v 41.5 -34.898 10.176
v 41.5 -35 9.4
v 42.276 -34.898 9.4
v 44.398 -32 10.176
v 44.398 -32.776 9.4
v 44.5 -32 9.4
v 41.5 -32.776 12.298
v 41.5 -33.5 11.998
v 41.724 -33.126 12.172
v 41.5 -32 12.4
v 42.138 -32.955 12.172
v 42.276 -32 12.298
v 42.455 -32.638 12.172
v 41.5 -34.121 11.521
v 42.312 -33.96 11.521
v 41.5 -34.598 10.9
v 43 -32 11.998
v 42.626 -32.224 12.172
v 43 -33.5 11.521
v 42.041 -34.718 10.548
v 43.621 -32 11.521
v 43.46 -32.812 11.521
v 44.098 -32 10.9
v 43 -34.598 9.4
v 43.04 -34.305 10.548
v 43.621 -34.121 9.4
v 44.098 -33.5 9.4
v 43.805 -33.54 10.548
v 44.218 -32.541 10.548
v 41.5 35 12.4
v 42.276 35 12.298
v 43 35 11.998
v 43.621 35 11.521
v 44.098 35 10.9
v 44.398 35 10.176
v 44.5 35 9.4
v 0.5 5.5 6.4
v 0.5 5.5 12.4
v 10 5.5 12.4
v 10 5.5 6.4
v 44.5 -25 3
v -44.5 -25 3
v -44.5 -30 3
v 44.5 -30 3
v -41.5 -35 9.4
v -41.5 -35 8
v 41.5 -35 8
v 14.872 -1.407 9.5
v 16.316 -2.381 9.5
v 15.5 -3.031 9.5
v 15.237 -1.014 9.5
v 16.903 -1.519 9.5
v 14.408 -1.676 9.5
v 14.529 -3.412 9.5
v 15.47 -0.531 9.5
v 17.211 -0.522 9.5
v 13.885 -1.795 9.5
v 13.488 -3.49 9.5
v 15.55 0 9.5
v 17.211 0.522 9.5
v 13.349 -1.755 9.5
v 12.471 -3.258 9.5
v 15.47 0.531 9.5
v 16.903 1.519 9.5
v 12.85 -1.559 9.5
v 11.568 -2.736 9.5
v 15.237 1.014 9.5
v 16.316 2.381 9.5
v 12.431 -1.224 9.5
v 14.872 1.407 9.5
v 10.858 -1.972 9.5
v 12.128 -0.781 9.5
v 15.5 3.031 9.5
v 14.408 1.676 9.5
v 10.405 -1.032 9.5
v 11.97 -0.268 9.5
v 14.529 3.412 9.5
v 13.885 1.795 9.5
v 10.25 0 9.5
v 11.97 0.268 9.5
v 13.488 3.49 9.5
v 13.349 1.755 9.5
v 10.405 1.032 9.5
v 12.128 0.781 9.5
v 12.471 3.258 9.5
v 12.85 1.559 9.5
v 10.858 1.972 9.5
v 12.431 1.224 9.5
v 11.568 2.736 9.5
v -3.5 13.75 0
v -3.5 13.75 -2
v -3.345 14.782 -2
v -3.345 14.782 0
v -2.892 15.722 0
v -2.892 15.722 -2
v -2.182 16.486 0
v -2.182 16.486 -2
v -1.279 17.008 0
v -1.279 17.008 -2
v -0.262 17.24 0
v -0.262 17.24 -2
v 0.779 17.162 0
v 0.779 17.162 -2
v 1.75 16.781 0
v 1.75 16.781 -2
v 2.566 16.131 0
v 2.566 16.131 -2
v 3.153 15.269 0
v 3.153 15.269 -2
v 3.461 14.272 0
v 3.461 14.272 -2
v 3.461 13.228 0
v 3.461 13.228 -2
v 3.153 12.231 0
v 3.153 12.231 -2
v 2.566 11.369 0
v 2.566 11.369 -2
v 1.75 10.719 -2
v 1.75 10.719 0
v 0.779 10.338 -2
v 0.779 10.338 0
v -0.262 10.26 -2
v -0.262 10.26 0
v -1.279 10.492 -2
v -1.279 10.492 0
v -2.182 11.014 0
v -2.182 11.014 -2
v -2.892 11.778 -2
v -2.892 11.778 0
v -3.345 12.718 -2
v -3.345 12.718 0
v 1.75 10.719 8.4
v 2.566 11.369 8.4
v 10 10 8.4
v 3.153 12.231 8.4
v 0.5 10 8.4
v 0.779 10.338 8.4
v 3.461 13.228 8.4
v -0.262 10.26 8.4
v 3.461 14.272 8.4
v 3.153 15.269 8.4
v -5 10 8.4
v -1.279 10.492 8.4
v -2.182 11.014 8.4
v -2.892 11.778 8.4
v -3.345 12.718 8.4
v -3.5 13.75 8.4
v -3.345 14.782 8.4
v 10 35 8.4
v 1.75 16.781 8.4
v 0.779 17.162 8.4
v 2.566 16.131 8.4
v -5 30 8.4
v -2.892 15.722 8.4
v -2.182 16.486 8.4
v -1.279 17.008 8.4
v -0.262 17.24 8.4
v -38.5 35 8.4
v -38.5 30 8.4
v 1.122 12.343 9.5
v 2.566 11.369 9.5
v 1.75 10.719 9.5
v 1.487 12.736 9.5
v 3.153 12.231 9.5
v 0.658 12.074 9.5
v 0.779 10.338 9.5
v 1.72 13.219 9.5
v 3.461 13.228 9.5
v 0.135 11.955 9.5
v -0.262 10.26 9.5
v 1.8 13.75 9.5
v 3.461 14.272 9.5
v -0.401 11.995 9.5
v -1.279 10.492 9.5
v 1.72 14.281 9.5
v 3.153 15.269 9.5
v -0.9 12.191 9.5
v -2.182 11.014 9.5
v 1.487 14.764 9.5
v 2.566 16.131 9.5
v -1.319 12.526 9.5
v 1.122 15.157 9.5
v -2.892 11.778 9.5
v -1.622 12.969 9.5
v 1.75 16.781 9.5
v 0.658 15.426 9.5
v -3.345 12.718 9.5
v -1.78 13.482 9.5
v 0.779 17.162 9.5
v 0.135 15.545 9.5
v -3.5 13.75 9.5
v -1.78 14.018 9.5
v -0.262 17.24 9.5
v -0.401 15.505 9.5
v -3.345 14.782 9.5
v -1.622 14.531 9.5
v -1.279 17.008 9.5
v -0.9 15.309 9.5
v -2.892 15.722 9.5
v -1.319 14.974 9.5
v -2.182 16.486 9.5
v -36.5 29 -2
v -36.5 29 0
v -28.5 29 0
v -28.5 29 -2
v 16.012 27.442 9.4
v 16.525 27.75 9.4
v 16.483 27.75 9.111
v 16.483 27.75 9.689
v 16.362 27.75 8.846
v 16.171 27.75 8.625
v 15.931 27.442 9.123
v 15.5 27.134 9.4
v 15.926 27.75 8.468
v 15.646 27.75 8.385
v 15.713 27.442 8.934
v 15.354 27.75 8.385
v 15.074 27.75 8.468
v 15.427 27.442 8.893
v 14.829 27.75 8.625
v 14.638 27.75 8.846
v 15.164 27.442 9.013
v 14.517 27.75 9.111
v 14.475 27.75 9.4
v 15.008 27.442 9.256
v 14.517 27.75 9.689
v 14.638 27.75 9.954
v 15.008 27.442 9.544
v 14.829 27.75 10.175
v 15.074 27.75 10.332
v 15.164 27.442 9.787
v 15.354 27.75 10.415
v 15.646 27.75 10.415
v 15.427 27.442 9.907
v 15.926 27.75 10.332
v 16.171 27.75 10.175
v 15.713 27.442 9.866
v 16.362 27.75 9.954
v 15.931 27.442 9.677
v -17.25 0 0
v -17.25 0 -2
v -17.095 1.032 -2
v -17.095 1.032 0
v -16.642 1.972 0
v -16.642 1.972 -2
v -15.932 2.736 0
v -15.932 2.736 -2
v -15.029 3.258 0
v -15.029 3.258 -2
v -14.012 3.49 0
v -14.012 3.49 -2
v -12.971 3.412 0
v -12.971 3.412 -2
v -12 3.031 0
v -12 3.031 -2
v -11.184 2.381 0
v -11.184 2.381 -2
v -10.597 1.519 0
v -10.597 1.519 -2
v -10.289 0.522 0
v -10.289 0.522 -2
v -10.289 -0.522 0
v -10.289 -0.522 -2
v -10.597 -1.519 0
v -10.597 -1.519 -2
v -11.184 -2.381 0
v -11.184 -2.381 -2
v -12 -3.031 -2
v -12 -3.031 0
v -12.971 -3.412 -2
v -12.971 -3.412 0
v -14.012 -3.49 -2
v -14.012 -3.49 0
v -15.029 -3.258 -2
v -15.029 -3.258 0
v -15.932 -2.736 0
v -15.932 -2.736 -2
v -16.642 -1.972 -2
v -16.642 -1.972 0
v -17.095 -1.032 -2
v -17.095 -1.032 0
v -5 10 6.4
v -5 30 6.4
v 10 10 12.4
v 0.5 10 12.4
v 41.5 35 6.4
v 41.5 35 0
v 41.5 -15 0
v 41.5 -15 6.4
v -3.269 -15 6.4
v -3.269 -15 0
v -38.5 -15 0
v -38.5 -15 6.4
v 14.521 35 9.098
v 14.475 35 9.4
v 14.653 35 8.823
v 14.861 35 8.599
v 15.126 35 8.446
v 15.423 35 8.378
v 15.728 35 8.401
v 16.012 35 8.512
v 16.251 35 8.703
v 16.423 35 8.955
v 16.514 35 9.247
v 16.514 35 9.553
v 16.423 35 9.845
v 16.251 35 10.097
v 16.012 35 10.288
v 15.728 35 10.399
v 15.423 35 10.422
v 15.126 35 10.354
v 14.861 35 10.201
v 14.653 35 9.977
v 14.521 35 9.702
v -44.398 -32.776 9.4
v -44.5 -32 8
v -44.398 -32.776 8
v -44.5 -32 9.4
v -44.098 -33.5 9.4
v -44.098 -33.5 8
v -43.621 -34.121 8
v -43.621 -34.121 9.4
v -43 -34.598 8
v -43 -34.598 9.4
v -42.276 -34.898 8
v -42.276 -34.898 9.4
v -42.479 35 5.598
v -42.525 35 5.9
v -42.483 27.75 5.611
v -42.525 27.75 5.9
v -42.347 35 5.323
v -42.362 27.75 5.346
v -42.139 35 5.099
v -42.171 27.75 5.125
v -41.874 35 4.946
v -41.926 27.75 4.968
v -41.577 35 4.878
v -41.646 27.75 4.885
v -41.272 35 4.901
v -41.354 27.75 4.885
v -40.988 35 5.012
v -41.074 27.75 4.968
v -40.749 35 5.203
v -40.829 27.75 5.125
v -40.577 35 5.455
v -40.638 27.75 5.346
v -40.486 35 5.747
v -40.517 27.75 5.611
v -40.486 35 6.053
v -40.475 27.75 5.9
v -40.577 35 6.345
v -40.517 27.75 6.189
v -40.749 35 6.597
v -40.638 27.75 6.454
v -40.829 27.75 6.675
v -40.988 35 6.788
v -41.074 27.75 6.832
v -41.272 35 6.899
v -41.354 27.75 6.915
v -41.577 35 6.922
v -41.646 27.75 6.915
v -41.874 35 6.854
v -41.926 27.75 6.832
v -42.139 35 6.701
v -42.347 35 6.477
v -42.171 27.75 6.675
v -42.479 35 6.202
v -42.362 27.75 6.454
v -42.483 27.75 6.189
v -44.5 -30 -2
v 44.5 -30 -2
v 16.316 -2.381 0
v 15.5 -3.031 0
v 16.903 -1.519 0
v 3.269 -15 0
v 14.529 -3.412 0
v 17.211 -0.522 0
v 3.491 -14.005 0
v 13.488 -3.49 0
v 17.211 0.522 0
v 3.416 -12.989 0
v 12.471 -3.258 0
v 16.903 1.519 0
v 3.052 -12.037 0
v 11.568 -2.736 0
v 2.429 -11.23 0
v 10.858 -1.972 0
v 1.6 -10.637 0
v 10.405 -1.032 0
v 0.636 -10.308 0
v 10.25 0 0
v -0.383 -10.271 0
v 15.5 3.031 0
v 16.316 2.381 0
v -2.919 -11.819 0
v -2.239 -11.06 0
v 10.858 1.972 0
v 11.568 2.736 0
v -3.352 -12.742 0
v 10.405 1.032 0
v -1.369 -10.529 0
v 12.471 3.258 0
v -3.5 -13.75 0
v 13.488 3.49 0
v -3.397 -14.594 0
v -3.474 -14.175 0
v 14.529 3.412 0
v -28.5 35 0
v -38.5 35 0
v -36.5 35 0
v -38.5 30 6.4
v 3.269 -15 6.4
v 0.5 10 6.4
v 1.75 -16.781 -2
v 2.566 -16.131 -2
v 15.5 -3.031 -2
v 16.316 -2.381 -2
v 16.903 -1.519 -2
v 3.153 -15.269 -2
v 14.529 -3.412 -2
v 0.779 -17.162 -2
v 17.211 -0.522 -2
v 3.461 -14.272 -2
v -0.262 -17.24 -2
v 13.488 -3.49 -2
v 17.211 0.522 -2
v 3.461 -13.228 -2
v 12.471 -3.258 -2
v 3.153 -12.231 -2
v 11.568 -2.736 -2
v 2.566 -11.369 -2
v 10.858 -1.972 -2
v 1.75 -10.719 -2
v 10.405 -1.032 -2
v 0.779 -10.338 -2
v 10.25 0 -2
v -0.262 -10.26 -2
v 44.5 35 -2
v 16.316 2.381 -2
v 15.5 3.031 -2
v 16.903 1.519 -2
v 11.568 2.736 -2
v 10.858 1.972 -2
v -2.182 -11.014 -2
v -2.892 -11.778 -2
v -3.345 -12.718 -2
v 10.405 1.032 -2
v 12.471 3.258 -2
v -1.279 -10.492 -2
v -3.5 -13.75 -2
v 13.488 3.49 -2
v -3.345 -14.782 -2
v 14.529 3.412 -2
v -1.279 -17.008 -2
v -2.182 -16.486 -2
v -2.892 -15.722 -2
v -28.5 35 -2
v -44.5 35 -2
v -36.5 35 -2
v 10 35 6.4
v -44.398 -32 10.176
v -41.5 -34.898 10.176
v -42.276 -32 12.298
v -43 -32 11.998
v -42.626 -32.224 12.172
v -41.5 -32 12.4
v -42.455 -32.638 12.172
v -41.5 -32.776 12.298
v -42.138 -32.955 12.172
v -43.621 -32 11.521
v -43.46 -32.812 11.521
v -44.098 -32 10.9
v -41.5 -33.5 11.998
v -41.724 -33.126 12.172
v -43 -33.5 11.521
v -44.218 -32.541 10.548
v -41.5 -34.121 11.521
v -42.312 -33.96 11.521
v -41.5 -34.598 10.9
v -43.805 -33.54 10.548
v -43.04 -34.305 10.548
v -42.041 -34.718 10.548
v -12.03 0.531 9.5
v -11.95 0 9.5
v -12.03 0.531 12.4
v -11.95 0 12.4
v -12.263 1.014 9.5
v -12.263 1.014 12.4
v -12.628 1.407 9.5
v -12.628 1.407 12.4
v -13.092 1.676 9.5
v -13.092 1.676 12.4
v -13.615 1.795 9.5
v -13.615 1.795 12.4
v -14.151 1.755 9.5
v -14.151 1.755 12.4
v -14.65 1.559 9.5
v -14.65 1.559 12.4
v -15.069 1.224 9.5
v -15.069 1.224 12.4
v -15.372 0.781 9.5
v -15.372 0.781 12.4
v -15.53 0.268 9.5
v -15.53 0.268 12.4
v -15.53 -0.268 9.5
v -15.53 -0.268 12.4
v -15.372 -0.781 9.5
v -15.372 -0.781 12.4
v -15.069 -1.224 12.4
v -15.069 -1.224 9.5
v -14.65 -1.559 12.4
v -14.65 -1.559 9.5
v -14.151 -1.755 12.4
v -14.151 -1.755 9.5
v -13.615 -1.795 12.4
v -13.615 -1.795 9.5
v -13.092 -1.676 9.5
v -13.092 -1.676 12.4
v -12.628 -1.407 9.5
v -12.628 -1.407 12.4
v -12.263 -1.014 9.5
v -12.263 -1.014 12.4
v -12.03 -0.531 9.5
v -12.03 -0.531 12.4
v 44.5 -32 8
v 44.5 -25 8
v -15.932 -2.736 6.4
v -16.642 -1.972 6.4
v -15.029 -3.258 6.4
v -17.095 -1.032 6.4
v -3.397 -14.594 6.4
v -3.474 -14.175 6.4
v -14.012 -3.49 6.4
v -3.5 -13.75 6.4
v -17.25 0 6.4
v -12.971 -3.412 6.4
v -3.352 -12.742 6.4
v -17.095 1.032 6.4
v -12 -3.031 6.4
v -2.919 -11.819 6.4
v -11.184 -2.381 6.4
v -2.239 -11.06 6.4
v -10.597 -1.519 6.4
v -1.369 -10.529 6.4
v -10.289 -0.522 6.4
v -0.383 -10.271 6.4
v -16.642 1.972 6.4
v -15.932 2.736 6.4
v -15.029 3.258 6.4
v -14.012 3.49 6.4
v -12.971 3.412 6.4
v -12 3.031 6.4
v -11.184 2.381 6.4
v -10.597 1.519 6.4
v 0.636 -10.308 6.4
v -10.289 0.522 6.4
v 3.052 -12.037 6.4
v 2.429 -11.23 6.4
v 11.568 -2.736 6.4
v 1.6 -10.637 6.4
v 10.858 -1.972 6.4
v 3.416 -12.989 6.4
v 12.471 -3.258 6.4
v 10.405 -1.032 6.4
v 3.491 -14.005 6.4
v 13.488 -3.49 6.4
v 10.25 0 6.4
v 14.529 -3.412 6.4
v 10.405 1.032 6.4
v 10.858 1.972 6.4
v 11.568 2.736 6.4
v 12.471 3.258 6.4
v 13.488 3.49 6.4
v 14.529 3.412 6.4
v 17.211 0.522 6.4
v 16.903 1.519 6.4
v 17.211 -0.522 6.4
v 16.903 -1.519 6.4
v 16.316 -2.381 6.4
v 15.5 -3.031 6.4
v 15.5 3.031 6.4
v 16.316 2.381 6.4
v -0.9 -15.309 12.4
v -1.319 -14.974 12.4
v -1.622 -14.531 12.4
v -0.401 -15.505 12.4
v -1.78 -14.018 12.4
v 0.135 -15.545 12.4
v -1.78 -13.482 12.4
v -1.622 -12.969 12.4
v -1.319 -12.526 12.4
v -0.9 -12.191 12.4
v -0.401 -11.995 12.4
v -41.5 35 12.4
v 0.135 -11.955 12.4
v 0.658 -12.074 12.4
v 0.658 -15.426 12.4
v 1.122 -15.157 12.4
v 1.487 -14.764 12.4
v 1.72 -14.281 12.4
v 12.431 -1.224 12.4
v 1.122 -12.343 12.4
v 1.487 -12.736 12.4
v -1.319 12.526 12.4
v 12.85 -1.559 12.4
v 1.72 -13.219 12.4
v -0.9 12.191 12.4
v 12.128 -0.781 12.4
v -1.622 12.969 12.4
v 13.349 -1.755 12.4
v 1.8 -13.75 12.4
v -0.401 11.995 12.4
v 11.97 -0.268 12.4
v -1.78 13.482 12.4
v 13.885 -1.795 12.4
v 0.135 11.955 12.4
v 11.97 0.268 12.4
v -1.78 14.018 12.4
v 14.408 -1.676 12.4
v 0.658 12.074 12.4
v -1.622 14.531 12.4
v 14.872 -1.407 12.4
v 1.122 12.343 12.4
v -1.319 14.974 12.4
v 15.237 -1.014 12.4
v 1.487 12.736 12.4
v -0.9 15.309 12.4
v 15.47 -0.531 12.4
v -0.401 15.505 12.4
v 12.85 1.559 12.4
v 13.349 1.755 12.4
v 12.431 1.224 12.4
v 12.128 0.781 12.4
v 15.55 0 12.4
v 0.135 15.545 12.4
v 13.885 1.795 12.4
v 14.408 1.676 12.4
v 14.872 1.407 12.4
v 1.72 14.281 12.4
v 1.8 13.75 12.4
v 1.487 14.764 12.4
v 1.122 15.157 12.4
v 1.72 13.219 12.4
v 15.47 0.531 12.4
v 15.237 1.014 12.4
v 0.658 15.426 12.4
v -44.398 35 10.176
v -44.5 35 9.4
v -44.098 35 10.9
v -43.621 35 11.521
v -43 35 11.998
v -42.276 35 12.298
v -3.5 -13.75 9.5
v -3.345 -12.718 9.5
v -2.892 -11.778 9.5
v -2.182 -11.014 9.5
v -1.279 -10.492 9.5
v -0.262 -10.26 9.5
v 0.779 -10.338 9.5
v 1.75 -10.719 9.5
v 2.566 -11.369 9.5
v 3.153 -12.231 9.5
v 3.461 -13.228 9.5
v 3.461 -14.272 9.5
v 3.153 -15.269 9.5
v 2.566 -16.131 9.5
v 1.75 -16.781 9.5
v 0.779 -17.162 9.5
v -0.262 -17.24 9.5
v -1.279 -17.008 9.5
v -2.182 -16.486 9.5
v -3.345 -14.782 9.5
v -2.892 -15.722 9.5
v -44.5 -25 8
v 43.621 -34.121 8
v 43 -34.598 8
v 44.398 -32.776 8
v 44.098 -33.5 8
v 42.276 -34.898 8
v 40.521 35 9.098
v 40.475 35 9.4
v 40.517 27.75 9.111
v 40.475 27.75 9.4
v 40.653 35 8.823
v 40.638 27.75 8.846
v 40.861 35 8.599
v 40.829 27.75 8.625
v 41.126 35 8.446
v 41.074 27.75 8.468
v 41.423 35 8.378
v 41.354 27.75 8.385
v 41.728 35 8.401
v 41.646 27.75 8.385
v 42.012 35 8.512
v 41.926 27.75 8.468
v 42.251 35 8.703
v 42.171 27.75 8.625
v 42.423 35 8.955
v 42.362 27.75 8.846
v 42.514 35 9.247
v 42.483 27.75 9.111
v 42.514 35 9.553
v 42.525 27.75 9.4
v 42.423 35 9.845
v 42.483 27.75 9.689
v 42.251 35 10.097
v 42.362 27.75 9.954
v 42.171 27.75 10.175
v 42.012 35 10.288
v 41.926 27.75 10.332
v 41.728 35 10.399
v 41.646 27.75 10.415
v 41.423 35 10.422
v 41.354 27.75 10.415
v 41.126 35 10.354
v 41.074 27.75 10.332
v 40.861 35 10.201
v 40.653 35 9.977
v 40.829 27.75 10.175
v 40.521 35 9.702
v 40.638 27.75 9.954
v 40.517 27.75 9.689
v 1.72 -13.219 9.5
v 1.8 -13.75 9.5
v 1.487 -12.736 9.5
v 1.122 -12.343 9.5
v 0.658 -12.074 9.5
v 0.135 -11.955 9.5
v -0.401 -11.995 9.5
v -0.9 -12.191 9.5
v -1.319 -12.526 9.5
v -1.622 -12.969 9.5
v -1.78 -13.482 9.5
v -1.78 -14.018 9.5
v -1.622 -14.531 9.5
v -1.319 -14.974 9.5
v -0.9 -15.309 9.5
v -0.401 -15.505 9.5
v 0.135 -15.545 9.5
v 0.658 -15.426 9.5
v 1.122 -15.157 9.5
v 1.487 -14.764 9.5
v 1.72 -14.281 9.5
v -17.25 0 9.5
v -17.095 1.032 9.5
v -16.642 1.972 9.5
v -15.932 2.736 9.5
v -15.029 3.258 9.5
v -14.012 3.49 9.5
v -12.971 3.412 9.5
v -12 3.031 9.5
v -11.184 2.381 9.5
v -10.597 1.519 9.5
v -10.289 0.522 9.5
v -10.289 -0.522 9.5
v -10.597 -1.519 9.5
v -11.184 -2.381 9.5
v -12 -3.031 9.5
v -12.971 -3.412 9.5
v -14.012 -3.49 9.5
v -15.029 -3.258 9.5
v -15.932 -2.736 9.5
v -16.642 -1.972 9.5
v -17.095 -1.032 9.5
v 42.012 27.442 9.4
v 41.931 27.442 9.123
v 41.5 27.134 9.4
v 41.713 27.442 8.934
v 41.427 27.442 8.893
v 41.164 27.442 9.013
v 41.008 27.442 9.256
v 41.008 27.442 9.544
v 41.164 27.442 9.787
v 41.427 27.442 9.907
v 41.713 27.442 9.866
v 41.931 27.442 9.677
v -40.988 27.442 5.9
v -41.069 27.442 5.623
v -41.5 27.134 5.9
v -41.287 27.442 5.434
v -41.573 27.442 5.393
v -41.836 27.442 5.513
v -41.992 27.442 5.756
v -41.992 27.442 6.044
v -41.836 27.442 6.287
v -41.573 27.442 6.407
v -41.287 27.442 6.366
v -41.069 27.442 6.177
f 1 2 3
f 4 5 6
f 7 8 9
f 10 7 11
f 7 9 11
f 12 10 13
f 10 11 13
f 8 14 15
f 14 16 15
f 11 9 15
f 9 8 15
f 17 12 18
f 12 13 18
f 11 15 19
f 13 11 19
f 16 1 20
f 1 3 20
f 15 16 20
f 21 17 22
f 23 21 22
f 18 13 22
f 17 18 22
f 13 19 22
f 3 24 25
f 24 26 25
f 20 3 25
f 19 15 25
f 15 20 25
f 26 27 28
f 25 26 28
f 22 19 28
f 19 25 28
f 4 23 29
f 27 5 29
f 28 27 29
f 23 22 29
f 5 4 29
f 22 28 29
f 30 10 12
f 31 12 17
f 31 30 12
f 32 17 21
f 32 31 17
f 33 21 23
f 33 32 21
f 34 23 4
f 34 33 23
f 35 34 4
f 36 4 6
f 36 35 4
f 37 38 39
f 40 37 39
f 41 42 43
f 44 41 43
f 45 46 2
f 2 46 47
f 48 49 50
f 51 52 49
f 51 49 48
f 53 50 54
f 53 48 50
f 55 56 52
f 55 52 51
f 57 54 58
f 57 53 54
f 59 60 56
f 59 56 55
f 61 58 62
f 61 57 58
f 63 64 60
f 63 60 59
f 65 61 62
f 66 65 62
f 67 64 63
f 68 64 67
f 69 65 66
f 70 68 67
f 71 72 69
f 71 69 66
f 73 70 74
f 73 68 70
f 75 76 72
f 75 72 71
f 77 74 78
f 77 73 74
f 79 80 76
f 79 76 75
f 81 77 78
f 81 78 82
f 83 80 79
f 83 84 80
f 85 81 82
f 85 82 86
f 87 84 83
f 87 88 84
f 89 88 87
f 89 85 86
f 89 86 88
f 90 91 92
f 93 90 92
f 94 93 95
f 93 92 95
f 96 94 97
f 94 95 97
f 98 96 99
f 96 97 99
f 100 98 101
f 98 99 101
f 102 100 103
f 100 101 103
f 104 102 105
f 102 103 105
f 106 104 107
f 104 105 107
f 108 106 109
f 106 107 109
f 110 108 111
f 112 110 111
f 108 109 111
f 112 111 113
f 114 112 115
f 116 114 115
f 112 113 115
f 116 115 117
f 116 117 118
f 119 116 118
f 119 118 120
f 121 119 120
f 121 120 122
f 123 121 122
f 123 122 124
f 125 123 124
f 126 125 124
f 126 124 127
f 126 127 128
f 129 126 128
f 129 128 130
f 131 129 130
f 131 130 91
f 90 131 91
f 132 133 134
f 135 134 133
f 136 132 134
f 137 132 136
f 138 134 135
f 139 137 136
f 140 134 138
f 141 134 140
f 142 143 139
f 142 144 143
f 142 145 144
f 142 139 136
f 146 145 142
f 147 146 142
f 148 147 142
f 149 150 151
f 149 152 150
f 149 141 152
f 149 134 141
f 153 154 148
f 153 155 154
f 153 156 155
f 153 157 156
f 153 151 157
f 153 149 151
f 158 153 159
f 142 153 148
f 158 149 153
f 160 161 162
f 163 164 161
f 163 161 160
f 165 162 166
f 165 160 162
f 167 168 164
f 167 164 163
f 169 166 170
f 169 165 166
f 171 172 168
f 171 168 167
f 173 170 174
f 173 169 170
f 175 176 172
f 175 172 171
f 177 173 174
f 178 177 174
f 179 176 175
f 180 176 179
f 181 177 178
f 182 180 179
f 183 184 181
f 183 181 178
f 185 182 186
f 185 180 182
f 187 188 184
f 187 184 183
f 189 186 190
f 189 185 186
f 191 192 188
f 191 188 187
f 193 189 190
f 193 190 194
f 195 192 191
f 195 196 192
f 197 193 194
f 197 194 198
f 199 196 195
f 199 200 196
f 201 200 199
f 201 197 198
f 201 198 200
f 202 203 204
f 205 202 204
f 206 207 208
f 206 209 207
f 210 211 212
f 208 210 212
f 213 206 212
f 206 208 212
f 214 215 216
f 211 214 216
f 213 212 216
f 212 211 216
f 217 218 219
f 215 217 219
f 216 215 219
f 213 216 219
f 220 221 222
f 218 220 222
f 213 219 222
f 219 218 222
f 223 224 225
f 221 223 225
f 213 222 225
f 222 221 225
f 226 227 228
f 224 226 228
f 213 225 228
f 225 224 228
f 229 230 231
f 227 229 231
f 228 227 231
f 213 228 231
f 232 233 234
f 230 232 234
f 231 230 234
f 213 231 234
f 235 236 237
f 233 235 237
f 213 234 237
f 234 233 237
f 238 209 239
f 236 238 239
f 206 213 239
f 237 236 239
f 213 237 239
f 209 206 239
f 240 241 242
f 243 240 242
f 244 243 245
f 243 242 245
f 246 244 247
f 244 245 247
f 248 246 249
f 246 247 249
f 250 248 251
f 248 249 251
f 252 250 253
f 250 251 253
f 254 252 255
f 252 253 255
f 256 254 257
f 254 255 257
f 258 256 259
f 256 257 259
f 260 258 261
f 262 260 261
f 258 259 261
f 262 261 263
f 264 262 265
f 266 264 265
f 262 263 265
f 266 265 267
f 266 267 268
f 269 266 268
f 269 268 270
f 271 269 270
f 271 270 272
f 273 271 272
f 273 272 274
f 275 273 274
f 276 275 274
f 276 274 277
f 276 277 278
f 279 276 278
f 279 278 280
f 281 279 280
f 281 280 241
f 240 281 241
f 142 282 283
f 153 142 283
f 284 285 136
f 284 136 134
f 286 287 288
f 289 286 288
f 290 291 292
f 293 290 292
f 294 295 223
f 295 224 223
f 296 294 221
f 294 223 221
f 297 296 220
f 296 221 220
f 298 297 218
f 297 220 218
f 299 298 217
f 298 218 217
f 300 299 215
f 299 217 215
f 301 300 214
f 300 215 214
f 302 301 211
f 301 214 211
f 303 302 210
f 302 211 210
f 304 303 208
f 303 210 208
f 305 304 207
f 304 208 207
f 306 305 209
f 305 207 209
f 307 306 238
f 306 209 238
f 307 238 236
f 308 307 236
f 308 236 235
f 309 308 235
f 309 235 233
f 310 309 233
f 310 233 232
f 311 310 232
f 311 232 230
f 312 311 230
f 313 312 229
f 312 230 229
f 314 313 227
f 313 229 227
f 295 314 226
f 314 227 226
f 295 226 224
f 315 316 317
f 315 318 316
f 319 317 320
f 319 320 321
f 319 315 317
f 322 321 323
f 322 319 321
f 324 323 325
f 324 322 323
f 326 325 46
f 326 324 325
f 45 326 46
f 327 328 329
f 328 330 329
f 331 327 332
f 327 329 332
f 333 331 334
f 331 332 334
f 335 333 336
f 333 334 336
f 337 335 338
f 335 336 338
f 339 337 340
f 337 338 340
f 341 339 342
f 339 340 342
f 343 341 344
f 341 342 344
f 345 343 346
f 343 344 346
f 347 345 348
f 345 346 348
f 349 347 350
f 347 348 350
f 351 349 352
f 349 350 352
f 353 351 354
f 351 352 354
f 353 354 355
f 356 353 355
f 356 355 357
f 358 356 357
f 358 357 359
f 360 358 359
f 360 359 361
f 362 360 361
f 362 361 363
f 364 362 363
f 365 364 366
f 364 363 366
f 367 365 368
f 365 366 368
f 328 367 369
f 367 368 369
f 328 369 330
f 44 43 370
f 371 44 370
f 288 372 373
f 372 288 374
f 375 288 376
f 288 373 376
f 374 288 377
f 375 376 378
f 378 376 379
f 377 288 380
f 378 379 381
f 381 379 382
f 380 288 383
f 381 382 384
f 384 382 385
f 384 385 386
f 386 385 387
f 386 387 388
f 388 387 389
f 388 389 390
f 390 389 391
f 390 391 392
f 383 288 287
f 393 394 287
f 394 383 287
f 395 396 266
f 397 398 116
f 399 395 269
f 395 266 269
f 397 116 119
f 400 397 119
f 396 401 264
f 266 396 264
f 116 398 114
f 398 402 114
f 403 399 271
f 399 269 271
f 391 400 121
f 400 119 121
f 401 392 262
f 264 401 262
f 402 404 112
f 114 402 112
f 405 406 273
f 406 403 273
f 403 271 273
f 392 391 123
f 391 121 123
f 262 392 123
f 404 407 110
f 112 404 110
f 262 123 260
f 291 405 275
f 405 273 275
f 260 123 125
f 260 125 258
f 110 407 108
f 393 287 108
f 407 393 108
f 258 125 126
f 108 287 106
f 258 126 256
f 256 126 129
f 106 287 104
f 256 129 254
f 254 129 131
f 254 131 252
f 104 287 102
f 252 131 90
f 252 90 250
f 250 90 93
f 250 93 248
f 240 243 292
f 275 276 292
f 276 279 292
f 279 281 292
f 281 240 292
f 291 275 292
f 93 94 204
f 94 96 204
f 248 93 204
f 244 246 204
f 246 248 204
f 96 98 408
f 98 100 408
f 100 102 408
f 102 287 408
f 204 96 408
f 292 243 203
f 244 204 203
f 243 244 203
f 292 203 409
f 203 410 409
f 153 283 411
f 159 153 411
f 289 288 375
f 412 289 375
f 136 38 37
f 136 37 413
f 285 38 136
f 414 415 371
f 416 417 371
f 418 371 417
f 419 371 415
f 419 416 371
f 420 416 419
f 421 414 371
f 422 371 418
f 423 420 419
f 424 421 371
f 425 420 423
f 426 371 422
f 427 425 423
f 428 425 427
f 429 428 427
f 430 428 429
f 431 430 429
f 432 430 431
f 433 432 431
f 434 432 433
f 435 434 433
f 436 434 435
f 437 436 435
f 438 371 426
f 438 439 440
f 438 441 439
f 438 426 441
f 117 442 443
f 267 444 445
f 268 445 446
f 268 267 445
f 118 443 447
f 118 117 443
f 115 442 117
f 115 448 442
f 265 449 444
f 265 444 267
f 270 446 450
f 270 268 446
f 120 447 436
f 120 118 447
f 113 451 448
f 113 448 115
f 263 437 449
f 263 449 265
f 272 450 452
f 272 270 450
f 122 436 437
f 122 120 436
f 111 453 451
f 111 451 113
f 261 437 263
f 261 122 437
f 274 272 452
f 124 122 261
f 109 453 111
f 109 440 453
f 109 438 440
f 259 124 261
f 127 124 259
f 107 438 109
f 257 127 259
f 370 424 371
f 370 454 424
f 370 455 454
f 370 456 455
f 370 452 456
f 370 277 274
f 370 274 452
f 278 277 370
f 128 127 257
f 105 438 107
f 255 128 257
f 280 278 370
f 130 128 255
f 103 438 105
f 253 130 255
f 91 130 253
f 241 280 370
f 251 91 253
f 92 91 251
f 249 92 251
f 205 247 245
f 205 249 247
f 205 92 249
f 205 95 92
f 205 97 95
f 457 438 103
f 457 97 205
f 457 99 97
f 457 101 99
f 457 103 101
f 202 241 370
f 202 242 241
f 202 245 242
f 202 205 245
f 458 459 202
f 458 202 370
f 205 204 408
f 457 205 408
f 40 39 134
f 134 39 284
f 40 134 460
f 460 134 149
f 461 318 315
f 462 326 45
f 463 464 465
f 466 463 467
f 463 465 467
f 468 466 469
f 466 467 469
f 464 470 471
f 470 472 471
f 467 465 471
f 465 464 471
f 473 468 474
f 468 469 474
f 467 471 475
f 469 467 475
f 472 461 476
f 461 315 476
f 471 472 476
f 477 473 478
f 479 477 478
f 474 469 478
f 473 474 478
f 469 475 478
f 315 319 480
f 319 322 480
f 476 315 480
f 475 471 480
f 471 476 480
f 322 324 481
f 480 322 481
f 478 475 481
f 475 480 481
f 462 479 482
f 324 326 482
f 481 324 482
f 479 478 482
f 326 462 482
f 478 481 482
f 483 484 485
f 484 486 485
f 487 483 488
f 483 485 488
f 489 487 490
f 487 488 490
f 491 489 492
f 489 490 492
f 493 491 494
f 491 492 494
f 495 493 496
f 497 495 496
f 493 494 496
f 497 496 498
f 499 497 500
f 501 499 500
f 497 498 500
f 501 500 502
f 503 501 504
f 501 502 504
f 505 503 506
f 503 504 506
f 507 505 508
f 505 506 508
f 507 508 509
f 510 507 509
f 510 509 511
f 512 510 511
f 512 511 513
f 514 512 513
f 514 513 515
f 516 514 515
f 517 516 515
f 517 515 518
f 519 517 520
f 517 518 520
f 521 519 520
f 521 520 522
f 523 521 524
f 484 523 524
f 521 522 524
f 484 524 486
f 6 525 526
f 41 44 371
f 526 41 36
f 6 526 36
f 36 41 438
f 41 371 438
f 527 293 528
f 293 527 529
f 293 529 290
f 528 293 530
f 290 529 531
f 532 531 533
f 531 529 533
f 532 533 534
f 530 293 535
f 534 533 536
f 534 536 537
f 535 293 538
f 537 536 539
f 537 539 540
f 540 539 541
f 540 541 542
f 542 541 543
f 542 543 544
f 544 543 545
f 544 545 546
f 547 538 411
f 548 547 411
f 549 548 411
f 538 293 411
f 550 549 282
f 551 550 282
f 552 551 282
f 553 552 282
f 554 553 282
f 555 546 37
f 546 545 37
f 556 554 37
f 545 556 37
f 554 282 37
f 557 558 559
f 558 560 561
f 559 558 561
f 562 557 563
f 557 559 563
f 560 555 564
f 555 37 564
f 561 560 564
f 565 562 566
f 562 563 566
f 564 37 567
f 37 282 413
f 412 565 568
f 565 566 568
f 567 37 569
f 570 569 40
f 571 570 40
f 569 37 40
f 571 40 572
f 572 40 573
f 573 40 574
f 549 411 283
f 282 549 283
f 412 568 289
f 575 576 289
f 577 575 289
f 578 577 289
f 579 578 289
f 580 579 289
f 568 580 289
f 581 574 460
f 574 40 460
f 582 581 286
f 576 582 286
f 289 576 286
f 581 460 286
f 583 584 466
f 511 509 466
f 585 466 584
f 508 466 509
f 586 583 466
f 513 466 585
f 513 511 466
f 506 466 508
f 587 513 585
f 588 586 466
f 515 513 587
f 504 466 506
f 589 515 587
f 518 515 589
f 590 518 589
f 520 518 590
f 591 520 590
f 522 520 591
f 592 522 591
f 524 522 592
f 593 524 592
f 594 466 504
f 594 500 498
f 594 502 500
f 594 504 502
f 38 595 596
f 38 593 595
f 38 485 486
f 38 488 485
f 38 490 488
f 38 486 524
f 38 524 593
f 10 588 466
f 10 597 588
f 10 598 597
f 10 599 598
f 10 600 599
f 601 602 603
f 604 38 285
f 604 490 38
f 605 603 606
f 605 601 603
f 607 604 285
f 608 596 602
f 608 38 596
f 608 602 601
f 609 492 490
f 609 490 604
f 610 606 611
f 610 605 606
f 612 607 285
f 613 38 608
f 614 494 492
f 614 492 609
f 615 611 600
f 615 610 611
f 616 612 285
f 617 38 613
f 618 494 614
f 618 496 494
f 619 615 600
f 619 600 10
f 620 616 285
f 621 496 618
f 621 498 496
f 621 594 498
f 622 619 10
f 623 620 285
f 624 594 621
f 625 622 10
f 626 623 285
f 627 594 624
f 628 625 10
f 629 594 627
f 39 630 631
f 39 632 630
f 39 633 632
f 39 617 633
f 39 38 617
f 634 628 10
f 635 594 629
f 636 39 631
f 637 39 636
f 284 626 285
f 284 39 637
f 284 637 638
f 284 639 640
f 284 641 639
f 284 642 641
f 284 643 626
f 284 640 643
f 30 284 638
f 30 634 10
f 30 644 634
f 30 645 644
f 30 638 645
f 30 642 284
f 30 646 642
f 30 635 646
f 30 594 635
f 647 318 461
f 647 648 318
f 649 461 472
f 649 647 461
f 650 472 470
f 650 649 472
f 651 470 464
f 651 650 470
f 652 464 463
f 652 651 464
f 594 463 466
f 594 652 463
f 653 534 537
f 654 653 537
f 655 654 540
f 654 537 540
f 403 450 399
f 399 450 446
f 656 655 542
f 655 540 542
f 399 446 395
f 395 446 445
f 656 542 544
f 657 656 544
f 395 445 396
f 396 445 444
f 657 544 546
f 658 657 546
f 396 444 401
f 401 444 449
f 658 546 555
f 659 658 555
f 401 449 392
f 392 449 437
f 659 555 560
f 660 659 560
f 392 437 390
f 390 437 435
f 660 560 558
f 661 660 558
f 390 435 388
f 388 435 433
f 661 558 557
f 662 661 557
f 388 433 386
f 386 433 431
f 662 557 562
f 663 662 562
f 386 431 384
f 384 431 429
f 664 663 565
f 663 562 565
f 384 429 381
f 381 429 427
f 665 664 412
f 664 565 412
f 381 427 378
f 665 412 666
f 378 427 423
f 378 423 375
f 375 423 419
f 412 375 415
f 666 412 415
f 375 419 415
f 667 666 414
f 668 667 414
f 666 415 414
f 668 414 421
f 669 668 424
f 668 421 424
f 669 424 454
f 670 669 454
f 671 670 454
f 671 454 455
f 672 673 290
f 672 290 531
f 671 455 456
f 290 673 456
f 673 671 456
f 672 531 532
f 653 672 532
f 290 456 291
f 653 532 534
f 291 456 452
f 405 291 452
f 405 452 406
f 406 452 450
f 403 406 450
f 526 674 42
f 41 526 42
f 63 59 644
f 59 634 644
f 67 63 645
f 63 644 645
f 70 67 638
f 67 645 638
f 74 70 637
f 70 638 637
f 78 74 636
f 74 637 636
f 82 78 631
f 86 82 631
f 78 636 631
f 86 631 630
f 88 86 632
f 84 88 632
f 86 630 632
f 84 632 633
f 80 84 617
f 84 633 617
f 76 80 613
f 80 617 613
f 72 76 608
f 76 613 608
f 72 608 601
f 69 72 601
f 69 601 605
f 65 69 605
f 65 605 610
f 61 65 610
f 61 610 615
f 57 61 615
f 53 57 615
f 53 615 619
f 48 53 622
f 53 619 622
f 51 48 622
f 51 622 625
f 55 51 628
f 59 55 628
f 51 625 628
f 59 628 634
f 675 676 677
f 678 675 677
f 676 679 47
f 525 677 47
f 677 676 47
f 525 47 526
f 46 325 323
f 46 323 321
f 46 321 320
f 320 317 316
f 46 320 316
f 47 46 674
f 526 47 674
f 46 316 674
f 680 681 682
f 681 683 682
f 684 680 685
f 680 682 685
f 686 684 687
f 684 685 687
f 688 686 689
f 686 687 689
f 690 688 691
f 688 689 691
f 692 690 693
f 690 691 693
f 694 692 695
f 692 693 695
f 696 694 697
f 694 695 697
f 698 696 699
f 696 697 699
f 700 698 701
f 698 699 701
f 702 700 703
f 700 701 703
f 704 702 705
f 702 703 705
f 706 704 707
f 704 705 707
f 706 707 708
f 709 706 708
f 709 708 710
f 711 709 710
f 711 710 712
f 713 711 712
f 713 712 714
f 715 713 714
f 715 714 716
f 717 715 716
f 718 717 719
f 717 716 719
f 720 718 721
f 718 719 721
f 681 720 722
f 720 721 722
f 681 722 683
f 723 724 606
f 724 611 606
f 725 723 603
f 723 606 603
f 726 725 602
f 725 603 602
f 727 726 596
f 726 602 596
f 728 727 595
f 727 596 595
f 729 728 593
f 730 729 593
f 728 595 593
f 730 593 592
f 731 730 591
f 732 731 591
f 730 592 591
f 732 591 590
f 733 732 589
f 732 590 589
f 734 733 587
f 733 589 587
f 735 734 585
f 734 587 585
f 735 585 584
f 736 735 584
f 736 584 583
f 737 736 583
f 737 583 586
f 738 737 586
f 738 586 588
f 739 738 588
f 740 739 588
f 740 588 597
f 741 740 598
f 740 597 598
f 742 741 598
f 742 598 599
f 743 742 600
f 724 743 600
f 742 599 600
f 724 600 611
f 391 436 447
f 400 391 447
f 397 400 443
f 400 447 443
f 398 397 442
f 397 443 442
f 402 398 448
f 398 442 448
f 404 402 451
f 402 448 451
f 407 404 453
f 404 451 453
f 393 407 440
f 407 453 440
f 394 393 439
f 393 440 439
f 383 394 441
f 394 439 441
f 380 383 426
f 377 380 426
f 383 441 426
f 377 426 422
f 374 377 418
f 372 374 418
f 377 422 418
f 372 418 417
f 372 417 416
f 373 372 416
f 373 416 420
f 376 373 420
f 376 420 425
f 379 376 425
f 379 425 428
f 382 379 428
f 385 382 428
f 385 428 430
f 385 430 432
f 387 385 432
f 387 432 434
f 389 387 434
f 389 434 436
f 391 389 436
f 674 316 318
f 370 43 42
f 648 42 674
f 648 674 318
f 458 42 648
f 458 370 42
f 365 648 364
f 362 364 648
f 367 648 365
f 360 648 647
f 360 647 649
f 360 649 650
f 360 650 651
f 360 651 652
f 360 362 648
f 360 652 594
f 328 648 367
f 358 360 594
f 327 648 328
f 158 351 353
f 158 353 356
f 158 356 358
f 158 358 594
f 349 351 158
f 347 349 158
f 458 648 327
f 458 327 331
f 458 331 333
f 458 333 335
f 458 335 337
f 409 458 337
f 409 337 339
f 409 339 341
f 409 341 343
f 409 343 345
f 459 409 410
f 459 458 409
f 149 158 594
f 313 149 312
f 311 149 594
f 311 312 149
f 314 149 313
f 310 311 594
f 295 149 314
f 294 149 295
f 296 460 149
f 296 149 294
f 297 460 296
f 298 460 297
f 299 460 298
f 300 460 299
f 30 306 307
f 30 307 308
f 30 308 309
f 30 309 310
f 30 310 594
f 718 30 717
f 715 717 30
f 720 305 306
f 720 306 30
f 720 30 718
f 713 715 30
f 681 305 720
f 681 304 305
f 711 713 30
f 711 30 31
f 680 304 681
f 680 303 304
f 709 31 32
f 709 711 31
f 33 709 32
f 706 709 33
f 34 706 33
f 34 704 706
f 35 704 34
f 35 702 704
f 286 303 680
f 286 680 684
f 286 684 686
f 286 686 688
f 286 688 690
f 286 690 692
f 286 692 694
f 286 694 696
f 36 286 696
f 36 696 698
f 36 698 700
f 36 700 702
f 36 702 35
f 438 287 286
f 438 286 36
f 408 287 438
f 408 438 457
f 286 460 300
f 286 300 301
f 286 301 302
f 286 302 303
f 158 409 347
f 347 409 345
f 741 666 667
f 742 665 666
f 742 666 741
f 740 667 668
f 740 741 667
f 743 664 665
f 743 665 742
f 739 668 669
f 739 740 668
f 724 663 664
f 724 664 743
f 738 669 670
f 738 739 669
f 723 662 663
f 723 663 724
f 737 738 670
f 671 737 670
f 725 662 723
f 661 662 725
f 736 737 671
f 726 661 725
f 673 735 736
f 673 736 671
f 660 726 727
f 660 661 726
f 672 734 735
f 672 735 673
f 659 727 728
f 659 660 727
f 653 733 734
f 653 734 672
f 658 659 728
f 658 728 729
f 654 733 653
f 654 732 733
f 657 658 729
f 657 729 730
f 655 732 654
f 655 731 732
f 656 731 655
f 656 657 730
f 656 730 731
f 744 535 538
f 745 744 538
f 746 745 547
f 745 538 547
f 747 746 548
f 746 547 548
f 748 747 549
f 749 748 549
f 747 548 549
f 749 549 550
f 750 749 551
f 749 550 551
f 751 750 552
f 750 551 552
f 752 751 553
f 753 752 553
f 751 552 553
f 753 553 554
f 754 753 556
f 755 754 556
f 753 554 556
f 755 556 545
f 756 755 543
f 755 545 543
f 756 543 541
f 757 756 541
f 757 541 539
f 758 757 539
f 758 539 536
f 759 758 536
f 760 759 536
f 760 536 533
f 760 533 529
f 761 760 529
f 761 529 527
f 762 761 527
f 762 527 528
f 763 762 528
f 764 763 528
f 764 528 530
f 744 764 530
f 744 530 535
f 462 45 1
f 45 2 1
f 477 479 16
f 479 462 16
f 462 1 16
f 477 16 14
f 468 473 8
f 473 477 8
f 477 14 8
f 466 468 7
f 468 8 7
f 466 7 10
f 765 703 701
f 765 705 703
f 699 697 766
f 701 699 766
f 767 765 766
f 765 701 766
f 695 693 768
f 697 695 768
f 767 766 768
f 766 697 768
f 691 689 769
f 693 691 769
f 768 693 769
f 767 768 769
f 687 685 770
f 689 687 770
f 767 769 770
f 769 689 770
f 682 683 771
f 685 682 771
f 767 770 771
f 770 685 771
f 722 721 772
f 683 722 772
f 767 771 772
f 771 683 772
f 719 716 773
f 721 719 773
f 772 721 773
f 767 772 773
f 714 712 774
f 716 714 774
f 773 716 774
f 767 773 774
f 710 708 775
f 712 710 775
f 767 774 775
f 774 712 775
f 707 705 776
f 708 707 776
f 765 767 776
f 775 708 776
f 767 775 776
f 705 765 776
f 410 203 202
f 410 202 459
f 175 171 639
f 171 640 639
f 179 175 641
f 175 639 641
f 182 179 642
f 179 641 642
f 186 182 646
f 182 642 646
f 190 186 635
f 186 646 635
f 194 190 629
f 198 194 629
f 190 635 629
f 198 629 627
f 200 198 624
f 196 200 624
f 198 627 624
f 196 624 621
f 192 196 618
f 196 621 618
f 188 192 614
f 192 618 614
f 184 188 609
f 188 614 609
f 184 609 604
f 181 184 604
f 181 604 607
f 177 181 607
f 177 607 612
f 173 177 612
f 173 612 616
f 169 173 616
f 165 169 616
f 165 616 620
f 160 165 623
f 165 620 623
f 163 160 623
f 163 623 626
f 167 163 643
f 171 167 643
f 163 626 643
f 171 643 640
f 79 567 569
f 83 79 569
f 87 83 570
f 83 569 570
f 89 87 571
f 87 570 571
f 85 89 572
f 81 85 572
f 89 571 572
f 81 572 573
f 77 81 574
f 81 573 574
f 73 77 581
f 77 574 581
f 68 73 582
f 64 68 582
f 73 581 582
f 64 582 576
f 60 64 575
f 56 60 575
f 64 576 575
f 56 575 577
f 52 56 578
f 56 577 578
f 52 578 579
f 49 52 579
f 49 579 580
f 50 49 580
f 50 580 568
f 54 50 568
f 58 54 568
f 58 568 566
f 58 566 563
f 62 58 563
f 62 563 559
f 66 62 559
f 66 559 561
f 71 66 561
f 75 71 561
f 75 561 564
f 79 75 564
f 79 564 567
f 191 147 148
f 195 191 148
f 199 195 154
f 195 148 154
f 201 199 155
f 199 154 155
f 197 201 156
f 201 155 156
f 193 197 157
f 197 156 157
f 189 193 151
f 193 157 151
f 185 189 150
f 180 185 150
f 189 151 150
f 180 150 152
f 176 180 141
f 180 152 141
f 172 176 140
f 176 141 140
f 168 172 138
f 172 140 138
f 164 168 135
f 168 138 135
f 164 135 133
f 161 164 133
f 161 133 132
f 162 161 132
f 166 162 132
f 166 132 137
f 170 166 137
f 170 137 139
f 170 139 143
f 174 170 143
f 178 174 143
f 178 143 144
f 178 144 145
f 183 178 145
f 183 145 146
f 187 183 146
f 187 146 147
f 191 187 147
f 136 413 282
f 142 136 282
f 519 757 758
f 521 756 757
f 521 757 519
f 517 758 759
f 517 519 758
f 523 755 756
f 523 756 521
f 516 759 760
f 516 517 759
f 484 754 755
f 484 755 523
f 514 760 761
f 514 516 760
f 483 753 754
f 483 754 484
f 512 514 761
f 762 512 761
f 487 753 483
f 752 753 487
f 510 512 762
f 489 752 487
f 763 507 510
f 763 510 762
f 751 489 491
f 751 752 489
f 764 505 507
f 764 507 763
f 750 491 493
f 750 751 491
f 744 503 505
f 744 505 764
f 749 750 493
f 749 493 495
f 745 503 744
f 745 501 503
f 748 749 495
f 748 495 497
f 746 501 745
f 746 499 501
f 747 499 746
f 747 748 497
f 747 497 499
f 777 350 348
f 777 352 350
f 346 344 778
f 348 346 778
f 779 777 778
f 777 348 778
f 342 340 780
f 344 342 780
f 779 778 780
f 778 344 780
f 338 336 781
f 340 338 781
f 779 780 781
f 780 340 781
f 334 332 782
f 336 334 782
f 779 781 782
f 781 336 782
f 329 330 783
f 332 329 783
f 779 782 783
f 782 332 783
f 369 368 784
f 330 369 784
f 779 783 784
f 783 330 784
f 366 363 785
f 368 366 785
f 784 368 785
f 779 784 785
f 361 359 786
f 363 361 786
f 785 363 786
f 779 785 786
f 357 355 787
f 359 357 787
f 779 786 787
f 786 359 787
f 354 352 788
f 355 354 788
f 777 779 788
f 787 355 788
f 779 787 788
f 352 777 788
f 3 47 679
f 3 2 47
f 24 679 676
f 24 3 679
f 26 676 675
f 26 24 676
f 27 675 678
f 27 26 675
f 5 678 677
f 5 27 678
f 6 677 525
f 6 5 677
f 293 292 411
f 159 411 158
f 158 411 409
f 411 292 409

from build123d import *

# Parameters (mm, degrees)
BOSS_EXTRUDE1_DEPTH            = 6.4
SKETCH2_W                      = 89
SKETCH2_H                      = 70
BOSS_EXTRUDE2_DEPTH            = 2
SKETCH3_W                      = 8
SKETCH3_H                      = 6
CUT_EXTRUDE1_DEPTH             = 2
SKETCH5_W                      = 89
SKETCH5_H                      = 70
BOSS_EXTRUDE3_DEPTH            = 6
CBORE_FOR_M3_SHCS1_D           = 3.6
CBORE_FOR_M3_SHCS1_CBORE_D     = 7
CBORE_FOR_M3_SHCS1_CBORE_DEPTH = 11.5
SKETCH8_W                      = 9.5
SKETCH8_H                      = 4.5
CUT_EXTRUDE3_DEPTH             = 6
SKETCH10_W                     = 33.5
SKETCH10_H                     = 5
CUT_EXTRUDE4_DEPTH             = 2
M2_5X0_45_TAPPED_HOLE1_D       = 2.05
M2_5X0_45_TAPPED_HOLE1_DEPTH   = 7.25
M2_5X0_45_TAPPED_HOLE1_TIP     = 0.615882135
CUT_EXTRUDE5_DEPTH             = 97.43526326
FILLET1_R                      = 3


with BuildPart() as part:
    # Sketch1 → Boss-Extrude1 (new body)
    with BuildSketch(Plane.XY):
        Polygon((-38.5, -15), (-38.5, 35), (-44.5, 35), (-44.5, -35), (44.5, -35), (44.5, 35), (41.5, 35), (41.5, -15), align=None)
    extrude(amount=BOSS_EXTRUDE1_DEPTH)

    # Sketch2 → Boss-Extrude2 (add)
    with BuildSketch(Plane(origin=(0, 0, 0), x_dir=(-1, 0, 0), z_dir=(0, 0, -1))):
        Rectangle(SKETCH2_W, SKETCH2_H)
    extrude(amount=BOSS_EXTRUDE2_DEPTH)

    # Sketch3 → Cut-Extrude1 (cut)
    with BuildSketch(Plane.XY):
        with Locations((-32.5, 32)):
            Rectangle(SKETCH3_W, SKETCH3_H)
    extrude(amount=-CUT_EXTRUDE1_DEPTH, mode=Mode.SUBTRACT)

    # Sketch5 → Boss-Extrude3 (add)
    with BuildSketch(Plane.XY.offset(6.4)):
        Rectangle(SKETCH5_W, SKETCH5_H)
    extrude(amount=BOSS_EXTRUDE3_DEPTH)

    # CBORE for M3 SHCS1 (through all)
    with Locations(Plane(origin=(0, 0, -2), x_dir=(-1, 0, 0), z_dir=(0, 0, -1))):
        with Locations((0, -13.75), (0, 13.75), (-13.75, 0), (13.75, 0)):
            CounterBoreHole(CBORE_FOR_M3_SHCS1_D / 2, CBORE_FOR_M3_SHCS1_CBORE_D / 2, CBORE_FOR_M3_SHCS1_CBORE_DEPTH)

    # Sketch8 → Cut-Extrude3 (cut)
    with BuildSketch(Plane.XY.offset(12.4)):
        with Locations((5.25, 7.75)):
            Rectangle(SKETCH8_W, SKETCH8_H)
    extrude(amount=-CUT_EXTRUDE3_DEPTH, mode=Mode.SUBTRACT)

    # Sketch10 → Cut-Extrude4 (cut)
    with BuildSketch(Plane(origin=(0, 0, 6.4), x_dir=(-1, 0, 0), z_dir=(0, 0, -1))):
        Polygon((-10, 35), (-10, 10), (5, 10), (5, 30), (5, 35), align=None)
        with Locations((21.75, 32.5)):
            Rectangle(SKETCH10_W, SKETCH10_H)
    extrude(amount=-CUT_EXTRUDE4_DEPTH, mode=Mode.SUBTRACT)

    # M2.5x0.45 Tapped Hole1
    with Locations(Plane(origin=(0, 35, 0), x_dir=(1, 0, 0), z_dir=(0, 1, 0))):
        with Locations((-41.5, -5.9), (41.5, -9.4), (15.5, -9.4)):
            Hole(M2_5X0_45_TAPPED_HOLE1_D / 2, depth=M2_5X0_45_TAPPED_HOLE1_DEPTH)
            with Locations((0, 0, -(M2_5X0_45_TAPPED_HOLE1_DEPTH + M2_5X0_45_TAPPED_HOLE1_TIP / 2))):  # 118° drill point
                Cone(0, M2_5X0_45_TAPPED_HOLE1_D / 2, M2_5X0_45_TAPPED_HOLE1_TIP, mode=Mode.SUBTRACT)

    # Sketch13 → Cut-Extrude5 (cut, through all)
    with BuildSketch(Plane.ZY.offset(44.5)):
        Polygon((-2, -35), (8, -35), (8, -25), (3, -25), (3, -30), (-2, -30), align=None)
    extrude(amount=-CUT_EXTRUDE5_DEPTH, mode=Mode.SUBTRACT)

    # Fillet1
    fillet1_edges = [part.edges().sort_by_distance(p)[0] for p in [
        (44.5, -35, 10.2),
        (-44.5, -35, 10.2),
        (-44.5, 0, 12.4),
        (0, -35, 12.4),
        (44.5, 0, 12.4),
    ]]
    fillet(fillet1_edges, radius=FILLET1_R)


solid = part.part
